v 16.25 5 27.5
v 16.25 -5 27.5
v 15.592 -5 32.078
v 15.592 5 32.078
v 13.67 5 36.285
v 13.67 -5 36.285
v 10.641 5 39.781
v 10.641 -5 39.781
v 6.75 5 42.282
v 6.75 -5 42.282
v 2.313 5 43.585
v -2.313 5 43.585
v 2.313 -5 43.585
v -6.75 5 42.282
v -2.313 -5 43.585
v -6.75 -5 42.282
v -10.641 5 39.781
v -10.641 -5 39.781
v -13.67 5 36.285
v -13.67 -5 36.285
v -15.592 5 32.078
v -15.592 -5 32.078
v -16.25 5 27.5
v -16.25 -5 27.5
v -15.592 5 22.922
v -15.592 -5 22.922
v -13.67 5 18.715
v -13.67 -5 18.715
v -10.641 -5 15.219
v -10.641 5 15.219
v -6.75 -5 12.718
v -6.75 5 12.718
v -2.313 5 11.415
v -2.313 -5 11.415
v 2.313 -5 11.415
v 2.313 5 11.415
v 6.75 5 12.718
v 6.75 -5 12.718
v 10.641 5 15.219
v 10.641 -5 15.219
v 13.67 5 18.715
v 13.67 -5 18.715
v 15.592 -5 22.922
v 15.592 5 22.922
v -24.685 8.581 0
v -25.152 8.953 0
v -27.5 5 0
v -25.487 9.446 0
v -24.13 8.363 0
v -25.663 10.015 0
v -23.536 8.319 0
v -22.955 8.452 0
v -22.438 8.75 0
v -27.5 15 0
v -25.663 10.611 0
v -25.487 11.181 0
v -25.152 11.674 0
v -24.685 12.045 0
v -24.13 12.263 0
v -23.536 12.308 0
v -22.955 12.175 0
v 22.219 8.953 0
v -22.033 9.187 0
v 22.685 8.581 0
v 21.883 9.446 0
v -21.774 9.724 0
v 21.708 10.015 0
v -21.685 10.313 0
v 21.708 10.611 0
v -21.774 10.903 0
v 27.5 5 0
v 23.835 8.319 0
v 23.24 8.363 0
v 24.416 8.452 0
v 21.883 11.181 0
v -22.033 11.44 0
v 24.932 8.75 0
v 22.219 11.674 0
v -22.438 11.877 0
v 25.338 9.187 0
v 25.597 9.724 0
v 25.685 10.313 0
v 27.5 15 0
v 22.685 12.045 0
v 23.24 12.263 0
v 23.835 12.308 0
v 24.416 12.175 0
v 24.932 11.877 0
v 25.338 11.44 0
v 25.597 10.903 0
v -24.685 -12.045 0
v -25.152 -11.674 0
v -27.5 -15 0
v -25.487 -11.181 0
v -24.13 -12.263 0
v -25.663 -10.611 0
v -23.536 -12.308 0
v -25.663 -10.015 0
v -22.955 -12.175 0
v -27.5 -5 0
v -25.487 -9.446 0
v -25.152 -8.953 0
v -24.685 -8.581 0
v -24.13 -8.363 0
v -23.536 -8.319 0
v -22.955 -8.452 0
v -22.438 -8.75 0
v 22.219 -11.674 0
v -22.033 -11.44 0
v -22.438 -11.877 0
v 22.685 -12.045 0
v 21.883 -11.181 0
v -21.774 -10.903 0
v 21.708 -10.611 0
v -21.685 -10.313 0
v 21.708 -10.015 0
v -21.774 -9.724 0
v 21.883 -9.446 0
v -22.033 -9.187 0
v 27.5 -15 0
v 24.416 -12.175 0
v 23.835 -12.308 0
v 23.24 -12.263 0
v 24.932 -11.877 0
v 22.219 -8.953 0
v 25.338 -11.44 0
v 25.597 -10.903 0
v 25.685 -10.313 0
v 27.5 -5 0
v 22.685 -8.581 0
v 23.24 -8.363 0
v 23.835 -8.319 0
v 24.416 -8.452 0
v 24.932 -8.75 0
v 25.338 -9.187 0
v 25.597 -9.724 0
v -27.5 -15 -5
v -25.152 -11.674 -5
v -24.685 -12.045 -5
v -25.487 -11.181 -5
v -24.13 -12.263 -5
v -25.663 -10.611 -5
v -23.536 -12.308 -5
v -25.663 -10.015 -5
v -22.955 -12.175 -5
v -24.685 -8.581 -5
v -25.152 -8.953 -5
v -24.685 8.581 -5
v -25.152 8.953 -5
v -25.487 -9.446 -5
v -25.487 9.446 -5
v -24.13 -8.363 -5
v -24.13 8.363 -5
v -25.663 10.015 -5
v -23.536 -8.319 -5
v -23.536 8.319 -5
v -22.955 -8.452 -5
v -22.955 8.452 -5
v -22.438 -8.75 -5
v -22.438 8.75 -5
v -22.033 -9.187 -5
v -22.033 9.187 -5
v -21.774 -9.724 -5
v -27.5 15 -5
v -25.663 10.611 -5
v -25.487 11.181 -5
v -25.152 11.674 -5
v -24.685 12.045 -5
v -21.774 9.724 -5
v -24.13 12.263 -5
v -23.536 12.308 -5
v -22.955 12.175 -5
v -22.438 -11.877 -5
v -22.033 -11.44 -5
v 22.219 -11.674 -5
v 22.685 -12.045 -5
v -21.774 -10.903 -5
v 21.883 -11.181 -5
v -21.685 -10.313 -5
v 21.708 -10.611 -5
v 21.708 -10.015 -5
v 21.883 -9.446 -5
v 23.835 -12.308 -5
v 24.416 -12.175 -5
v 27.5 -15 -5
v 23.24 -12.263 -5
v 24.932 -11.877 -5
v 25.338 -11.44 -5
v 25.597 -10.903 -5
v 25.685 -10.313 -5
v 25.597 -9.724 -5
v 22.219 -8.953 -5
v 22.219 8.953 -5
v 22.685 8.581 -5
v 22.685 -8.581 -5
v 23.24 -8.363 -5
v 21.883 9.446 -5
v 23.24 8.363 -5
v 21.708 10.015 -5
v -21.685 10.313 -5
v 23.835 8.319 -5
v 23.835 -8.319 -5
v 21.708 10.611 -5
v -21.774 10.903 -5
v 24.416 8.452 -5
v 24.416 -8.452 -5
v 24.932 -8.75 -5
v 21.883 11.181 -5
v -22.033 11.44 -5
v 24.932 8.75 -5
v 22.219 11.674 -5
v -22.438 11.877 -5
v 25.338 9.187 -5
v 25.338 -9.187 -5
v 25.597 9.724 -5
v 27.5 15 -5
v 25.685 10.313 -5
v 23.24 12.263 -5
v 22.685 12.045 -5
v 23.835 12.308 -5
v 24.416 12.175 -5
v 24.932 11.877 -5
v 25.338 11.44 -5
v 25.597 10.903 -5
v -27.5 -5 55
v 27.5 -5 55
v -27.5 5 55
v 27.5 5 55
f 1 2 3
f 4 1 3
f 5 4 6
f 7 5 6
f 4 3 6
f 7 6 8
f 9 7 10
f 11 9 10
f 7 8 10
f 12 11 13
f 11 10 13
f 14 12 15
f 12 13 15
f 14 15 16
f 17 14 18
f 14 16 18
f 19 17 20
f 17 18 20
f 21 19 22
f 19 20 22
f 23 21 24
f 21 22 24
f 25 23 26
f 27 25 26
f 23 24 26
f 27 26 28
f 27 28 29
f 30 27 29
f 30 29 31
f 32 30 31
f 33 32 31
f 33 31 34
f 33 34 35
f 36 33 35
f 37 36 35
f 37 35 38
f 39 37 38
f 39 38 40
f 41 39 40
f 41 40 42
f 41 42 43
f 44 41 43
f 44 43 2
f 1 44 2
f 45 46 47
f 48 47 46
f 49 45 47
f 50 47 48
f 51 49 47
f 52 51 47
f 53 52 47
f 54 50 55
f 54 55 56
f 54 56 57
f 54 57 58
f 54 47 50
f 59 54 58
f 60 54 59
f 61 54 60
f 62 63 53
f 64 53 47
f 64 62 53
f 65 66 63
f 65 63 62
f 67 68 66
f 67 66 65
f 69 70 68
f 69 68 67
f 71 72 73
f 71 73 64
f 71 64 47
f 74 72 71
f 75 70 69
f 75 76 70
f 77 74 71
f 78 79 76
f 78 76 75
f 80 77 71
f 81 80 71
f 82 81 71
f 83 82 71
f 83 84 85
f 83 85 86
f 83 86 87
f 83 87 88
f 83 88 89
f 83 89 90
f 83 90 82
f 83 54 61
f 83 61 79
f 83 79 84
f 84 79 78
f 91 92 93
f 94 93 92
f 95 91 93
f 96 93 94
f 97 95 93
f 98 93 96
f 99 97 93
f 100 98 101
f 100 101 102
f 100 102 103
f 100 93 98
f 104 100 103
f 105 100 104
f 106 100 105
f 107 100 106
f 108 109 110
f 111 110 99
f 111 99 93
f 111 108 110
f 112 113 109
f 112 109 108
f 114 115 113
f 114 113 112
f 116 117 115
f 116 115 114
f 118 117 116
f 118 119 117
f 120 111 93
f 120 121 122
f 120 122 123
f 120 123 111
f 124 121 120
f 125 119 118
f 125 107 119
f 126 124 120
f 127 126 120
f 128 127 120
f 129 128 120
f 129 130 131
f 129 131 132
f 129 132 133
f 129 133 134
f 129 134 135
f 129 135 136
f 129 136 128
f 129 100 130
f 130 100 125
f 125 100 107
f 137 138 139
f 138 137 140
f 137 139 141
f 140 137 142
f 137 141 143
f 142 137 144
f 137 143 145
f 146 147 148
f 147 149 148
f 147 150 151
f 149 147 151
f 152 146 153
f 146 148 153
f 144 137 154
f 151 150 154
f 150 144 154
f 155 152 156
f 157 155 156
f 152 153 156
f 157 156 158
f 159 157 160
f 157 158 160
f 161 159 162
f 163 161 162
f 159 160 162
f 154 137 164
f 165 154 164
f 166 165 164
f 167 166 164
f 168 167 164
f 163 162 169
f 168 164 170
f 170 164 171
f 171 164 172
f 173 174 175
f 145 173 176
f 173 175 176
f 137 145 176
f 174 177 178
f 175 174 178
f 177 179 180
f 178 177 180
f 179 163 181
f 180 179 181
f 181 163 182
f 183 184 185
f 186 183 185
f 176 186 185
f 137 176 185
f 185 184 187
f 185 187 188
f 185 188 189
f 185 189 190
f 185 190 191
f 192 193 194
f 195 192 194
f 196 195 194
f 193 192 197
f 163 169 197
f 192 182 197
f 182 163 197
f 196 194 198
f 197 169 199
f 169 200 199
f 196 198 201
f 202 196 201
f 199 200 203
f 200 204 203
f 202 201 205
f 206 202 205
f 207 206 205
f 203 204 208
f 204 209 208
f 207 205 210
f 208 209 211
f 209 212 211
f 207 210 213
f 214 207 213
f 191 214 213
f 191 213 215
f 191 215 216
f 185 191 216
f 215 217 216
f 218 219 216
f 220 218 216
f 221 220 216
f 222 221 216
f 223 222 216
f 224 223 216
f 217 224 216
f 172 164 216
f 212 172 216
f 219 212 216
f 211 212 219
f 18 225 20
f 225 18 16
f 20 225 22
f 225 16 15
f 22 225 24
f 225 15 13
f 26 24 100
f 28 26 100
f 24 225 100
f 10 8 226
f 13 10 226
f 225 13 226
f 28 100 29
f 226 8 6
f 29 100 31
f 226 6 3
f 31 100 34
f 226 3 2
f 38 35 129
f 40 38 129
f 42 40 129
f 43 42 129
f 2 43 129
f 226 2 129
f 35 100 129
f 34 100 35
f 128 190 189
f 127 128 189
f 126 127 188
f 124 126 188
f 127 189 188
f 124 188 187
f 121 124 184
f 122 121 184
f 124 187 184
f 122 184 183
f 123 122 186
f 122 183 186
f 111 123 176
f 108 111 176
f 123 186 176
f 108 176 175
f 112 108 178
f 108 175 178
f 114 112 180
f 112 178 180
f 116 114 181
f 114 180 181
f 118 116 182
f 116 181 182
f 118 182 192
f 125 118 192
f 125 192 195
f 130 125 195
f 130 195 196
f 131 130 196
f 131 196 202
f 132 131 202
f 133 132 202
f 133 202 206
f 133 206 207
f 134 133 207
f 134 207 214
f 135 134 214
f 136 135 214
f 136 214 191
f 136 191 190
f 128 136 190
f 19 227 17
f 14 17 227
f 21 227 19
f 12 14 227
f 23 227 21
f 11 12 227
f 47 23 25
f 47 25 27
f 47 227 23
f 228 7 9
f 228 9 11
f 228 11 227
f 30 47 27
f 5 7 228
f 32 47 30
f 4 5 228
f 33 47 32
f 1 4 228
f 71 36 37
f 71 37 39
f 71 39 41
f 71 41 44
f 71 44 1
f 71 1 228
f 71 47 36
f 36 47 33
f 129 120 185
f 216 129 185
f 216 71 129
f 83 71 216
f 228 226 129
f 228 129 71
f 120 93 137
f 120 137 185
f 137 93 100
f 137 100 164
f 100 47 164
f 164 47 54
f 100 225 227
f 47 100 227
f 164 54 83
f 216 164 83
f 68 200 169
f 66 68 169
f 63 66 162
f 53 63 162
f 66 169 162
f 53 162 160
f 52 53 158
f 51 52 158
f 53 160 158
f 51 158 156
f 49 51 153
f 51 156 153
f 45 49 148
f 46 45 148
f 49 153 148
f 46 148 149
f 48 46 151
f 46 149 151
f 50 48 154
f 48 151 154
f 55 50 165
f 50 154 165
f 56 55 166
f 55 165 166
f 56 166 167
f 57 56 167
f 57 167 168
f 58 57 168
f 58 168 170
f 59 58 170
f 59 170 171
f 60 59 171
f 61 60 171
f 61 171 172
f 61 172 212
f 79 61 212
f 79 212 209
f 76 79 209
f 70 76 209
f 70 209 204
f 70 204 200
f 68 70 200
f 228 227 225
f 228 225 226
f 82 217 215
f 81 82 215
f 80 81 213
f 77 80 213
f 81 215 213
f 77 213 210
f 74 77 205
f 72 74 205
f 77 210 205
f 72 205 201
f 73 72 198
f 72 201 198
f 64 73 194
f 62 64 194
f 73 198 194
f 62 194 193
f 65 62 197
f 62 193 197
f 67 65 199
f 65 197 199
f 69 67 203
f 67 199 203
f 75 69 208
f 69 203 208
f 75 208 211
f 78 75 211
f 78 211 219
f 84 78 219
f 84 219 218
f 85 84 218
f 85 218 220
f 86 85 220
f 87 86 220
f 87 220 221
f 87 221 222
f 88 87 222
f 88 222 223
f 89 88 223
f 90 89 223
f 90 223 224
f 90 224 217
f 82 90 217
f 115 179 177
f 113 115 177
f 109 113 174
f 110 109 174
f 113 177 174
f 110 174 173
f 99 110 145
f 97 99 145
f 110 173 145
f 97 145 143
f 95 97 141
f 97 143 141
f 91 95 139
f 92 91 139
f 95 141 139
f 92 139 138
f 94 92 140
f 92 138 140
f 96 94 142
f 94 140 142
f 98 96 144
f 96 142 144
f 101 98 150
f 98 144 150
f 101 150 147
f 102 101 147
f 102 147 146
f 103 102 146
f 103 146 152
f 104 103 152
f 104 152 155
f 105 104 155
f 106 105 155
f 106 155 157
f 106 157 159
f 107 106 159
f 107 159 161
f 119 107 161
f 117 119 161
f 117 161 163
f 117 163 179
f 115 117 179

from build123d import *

# Parameters (mm, degrees)
F0_W     = 55
F0_H     = 10
F1_DEPTH = 55
F2_R     = 16.25
F3_DEPTH = 25
F4_W     = 55
F4_H     = 30
F5_DEPTH = 5
F6_R     = 2
F7_DEPTH = 25


with BuildPart() as f1:
    # F0 (on Top) → F1 (new body)
    with BuildSketch(Plane.XY):
        Rectangle(F0_W, F0_H)
    extrude(amount=F1_DEPTH)

    # F2 (on face) → F3 (cut)
    with BuildSketch(Plane.XZ.offset(5)):
        with Locations((0, 27.5)):
            Circle(F2_R)
    extrude(amount=-F3_DEPTH, mode=Mode.SUBTRACT)

    # F4 (on Top) → F5 (join)
    with BuildSketch(Plane.XY):
        Rectangle(F4_W, F4_H)
    extrude(amount=-F5_DEPTH)

    # F6 (on face) → F7 (cut)
    with BuildSketch(Plane(origin=(0, 0, -5), x_dir=(1, 0, 0), z_dir=(0, 0, -1))):
        with Locations((23.685403, 10.313298)):
            Circle(F6_R)
        with Locations((-23.685403, 10.313298)):
            Circle(F6_R)
        with Locations((-23.685403, -10.313298)):
            Circle(F6_R)
        with Locations((23.685403, -10.313298)):
            Circle(F6_R)
    extrude(amount=-F7_DEPTH, mode=Mode.SUBTRACT)


solid = f1.part
